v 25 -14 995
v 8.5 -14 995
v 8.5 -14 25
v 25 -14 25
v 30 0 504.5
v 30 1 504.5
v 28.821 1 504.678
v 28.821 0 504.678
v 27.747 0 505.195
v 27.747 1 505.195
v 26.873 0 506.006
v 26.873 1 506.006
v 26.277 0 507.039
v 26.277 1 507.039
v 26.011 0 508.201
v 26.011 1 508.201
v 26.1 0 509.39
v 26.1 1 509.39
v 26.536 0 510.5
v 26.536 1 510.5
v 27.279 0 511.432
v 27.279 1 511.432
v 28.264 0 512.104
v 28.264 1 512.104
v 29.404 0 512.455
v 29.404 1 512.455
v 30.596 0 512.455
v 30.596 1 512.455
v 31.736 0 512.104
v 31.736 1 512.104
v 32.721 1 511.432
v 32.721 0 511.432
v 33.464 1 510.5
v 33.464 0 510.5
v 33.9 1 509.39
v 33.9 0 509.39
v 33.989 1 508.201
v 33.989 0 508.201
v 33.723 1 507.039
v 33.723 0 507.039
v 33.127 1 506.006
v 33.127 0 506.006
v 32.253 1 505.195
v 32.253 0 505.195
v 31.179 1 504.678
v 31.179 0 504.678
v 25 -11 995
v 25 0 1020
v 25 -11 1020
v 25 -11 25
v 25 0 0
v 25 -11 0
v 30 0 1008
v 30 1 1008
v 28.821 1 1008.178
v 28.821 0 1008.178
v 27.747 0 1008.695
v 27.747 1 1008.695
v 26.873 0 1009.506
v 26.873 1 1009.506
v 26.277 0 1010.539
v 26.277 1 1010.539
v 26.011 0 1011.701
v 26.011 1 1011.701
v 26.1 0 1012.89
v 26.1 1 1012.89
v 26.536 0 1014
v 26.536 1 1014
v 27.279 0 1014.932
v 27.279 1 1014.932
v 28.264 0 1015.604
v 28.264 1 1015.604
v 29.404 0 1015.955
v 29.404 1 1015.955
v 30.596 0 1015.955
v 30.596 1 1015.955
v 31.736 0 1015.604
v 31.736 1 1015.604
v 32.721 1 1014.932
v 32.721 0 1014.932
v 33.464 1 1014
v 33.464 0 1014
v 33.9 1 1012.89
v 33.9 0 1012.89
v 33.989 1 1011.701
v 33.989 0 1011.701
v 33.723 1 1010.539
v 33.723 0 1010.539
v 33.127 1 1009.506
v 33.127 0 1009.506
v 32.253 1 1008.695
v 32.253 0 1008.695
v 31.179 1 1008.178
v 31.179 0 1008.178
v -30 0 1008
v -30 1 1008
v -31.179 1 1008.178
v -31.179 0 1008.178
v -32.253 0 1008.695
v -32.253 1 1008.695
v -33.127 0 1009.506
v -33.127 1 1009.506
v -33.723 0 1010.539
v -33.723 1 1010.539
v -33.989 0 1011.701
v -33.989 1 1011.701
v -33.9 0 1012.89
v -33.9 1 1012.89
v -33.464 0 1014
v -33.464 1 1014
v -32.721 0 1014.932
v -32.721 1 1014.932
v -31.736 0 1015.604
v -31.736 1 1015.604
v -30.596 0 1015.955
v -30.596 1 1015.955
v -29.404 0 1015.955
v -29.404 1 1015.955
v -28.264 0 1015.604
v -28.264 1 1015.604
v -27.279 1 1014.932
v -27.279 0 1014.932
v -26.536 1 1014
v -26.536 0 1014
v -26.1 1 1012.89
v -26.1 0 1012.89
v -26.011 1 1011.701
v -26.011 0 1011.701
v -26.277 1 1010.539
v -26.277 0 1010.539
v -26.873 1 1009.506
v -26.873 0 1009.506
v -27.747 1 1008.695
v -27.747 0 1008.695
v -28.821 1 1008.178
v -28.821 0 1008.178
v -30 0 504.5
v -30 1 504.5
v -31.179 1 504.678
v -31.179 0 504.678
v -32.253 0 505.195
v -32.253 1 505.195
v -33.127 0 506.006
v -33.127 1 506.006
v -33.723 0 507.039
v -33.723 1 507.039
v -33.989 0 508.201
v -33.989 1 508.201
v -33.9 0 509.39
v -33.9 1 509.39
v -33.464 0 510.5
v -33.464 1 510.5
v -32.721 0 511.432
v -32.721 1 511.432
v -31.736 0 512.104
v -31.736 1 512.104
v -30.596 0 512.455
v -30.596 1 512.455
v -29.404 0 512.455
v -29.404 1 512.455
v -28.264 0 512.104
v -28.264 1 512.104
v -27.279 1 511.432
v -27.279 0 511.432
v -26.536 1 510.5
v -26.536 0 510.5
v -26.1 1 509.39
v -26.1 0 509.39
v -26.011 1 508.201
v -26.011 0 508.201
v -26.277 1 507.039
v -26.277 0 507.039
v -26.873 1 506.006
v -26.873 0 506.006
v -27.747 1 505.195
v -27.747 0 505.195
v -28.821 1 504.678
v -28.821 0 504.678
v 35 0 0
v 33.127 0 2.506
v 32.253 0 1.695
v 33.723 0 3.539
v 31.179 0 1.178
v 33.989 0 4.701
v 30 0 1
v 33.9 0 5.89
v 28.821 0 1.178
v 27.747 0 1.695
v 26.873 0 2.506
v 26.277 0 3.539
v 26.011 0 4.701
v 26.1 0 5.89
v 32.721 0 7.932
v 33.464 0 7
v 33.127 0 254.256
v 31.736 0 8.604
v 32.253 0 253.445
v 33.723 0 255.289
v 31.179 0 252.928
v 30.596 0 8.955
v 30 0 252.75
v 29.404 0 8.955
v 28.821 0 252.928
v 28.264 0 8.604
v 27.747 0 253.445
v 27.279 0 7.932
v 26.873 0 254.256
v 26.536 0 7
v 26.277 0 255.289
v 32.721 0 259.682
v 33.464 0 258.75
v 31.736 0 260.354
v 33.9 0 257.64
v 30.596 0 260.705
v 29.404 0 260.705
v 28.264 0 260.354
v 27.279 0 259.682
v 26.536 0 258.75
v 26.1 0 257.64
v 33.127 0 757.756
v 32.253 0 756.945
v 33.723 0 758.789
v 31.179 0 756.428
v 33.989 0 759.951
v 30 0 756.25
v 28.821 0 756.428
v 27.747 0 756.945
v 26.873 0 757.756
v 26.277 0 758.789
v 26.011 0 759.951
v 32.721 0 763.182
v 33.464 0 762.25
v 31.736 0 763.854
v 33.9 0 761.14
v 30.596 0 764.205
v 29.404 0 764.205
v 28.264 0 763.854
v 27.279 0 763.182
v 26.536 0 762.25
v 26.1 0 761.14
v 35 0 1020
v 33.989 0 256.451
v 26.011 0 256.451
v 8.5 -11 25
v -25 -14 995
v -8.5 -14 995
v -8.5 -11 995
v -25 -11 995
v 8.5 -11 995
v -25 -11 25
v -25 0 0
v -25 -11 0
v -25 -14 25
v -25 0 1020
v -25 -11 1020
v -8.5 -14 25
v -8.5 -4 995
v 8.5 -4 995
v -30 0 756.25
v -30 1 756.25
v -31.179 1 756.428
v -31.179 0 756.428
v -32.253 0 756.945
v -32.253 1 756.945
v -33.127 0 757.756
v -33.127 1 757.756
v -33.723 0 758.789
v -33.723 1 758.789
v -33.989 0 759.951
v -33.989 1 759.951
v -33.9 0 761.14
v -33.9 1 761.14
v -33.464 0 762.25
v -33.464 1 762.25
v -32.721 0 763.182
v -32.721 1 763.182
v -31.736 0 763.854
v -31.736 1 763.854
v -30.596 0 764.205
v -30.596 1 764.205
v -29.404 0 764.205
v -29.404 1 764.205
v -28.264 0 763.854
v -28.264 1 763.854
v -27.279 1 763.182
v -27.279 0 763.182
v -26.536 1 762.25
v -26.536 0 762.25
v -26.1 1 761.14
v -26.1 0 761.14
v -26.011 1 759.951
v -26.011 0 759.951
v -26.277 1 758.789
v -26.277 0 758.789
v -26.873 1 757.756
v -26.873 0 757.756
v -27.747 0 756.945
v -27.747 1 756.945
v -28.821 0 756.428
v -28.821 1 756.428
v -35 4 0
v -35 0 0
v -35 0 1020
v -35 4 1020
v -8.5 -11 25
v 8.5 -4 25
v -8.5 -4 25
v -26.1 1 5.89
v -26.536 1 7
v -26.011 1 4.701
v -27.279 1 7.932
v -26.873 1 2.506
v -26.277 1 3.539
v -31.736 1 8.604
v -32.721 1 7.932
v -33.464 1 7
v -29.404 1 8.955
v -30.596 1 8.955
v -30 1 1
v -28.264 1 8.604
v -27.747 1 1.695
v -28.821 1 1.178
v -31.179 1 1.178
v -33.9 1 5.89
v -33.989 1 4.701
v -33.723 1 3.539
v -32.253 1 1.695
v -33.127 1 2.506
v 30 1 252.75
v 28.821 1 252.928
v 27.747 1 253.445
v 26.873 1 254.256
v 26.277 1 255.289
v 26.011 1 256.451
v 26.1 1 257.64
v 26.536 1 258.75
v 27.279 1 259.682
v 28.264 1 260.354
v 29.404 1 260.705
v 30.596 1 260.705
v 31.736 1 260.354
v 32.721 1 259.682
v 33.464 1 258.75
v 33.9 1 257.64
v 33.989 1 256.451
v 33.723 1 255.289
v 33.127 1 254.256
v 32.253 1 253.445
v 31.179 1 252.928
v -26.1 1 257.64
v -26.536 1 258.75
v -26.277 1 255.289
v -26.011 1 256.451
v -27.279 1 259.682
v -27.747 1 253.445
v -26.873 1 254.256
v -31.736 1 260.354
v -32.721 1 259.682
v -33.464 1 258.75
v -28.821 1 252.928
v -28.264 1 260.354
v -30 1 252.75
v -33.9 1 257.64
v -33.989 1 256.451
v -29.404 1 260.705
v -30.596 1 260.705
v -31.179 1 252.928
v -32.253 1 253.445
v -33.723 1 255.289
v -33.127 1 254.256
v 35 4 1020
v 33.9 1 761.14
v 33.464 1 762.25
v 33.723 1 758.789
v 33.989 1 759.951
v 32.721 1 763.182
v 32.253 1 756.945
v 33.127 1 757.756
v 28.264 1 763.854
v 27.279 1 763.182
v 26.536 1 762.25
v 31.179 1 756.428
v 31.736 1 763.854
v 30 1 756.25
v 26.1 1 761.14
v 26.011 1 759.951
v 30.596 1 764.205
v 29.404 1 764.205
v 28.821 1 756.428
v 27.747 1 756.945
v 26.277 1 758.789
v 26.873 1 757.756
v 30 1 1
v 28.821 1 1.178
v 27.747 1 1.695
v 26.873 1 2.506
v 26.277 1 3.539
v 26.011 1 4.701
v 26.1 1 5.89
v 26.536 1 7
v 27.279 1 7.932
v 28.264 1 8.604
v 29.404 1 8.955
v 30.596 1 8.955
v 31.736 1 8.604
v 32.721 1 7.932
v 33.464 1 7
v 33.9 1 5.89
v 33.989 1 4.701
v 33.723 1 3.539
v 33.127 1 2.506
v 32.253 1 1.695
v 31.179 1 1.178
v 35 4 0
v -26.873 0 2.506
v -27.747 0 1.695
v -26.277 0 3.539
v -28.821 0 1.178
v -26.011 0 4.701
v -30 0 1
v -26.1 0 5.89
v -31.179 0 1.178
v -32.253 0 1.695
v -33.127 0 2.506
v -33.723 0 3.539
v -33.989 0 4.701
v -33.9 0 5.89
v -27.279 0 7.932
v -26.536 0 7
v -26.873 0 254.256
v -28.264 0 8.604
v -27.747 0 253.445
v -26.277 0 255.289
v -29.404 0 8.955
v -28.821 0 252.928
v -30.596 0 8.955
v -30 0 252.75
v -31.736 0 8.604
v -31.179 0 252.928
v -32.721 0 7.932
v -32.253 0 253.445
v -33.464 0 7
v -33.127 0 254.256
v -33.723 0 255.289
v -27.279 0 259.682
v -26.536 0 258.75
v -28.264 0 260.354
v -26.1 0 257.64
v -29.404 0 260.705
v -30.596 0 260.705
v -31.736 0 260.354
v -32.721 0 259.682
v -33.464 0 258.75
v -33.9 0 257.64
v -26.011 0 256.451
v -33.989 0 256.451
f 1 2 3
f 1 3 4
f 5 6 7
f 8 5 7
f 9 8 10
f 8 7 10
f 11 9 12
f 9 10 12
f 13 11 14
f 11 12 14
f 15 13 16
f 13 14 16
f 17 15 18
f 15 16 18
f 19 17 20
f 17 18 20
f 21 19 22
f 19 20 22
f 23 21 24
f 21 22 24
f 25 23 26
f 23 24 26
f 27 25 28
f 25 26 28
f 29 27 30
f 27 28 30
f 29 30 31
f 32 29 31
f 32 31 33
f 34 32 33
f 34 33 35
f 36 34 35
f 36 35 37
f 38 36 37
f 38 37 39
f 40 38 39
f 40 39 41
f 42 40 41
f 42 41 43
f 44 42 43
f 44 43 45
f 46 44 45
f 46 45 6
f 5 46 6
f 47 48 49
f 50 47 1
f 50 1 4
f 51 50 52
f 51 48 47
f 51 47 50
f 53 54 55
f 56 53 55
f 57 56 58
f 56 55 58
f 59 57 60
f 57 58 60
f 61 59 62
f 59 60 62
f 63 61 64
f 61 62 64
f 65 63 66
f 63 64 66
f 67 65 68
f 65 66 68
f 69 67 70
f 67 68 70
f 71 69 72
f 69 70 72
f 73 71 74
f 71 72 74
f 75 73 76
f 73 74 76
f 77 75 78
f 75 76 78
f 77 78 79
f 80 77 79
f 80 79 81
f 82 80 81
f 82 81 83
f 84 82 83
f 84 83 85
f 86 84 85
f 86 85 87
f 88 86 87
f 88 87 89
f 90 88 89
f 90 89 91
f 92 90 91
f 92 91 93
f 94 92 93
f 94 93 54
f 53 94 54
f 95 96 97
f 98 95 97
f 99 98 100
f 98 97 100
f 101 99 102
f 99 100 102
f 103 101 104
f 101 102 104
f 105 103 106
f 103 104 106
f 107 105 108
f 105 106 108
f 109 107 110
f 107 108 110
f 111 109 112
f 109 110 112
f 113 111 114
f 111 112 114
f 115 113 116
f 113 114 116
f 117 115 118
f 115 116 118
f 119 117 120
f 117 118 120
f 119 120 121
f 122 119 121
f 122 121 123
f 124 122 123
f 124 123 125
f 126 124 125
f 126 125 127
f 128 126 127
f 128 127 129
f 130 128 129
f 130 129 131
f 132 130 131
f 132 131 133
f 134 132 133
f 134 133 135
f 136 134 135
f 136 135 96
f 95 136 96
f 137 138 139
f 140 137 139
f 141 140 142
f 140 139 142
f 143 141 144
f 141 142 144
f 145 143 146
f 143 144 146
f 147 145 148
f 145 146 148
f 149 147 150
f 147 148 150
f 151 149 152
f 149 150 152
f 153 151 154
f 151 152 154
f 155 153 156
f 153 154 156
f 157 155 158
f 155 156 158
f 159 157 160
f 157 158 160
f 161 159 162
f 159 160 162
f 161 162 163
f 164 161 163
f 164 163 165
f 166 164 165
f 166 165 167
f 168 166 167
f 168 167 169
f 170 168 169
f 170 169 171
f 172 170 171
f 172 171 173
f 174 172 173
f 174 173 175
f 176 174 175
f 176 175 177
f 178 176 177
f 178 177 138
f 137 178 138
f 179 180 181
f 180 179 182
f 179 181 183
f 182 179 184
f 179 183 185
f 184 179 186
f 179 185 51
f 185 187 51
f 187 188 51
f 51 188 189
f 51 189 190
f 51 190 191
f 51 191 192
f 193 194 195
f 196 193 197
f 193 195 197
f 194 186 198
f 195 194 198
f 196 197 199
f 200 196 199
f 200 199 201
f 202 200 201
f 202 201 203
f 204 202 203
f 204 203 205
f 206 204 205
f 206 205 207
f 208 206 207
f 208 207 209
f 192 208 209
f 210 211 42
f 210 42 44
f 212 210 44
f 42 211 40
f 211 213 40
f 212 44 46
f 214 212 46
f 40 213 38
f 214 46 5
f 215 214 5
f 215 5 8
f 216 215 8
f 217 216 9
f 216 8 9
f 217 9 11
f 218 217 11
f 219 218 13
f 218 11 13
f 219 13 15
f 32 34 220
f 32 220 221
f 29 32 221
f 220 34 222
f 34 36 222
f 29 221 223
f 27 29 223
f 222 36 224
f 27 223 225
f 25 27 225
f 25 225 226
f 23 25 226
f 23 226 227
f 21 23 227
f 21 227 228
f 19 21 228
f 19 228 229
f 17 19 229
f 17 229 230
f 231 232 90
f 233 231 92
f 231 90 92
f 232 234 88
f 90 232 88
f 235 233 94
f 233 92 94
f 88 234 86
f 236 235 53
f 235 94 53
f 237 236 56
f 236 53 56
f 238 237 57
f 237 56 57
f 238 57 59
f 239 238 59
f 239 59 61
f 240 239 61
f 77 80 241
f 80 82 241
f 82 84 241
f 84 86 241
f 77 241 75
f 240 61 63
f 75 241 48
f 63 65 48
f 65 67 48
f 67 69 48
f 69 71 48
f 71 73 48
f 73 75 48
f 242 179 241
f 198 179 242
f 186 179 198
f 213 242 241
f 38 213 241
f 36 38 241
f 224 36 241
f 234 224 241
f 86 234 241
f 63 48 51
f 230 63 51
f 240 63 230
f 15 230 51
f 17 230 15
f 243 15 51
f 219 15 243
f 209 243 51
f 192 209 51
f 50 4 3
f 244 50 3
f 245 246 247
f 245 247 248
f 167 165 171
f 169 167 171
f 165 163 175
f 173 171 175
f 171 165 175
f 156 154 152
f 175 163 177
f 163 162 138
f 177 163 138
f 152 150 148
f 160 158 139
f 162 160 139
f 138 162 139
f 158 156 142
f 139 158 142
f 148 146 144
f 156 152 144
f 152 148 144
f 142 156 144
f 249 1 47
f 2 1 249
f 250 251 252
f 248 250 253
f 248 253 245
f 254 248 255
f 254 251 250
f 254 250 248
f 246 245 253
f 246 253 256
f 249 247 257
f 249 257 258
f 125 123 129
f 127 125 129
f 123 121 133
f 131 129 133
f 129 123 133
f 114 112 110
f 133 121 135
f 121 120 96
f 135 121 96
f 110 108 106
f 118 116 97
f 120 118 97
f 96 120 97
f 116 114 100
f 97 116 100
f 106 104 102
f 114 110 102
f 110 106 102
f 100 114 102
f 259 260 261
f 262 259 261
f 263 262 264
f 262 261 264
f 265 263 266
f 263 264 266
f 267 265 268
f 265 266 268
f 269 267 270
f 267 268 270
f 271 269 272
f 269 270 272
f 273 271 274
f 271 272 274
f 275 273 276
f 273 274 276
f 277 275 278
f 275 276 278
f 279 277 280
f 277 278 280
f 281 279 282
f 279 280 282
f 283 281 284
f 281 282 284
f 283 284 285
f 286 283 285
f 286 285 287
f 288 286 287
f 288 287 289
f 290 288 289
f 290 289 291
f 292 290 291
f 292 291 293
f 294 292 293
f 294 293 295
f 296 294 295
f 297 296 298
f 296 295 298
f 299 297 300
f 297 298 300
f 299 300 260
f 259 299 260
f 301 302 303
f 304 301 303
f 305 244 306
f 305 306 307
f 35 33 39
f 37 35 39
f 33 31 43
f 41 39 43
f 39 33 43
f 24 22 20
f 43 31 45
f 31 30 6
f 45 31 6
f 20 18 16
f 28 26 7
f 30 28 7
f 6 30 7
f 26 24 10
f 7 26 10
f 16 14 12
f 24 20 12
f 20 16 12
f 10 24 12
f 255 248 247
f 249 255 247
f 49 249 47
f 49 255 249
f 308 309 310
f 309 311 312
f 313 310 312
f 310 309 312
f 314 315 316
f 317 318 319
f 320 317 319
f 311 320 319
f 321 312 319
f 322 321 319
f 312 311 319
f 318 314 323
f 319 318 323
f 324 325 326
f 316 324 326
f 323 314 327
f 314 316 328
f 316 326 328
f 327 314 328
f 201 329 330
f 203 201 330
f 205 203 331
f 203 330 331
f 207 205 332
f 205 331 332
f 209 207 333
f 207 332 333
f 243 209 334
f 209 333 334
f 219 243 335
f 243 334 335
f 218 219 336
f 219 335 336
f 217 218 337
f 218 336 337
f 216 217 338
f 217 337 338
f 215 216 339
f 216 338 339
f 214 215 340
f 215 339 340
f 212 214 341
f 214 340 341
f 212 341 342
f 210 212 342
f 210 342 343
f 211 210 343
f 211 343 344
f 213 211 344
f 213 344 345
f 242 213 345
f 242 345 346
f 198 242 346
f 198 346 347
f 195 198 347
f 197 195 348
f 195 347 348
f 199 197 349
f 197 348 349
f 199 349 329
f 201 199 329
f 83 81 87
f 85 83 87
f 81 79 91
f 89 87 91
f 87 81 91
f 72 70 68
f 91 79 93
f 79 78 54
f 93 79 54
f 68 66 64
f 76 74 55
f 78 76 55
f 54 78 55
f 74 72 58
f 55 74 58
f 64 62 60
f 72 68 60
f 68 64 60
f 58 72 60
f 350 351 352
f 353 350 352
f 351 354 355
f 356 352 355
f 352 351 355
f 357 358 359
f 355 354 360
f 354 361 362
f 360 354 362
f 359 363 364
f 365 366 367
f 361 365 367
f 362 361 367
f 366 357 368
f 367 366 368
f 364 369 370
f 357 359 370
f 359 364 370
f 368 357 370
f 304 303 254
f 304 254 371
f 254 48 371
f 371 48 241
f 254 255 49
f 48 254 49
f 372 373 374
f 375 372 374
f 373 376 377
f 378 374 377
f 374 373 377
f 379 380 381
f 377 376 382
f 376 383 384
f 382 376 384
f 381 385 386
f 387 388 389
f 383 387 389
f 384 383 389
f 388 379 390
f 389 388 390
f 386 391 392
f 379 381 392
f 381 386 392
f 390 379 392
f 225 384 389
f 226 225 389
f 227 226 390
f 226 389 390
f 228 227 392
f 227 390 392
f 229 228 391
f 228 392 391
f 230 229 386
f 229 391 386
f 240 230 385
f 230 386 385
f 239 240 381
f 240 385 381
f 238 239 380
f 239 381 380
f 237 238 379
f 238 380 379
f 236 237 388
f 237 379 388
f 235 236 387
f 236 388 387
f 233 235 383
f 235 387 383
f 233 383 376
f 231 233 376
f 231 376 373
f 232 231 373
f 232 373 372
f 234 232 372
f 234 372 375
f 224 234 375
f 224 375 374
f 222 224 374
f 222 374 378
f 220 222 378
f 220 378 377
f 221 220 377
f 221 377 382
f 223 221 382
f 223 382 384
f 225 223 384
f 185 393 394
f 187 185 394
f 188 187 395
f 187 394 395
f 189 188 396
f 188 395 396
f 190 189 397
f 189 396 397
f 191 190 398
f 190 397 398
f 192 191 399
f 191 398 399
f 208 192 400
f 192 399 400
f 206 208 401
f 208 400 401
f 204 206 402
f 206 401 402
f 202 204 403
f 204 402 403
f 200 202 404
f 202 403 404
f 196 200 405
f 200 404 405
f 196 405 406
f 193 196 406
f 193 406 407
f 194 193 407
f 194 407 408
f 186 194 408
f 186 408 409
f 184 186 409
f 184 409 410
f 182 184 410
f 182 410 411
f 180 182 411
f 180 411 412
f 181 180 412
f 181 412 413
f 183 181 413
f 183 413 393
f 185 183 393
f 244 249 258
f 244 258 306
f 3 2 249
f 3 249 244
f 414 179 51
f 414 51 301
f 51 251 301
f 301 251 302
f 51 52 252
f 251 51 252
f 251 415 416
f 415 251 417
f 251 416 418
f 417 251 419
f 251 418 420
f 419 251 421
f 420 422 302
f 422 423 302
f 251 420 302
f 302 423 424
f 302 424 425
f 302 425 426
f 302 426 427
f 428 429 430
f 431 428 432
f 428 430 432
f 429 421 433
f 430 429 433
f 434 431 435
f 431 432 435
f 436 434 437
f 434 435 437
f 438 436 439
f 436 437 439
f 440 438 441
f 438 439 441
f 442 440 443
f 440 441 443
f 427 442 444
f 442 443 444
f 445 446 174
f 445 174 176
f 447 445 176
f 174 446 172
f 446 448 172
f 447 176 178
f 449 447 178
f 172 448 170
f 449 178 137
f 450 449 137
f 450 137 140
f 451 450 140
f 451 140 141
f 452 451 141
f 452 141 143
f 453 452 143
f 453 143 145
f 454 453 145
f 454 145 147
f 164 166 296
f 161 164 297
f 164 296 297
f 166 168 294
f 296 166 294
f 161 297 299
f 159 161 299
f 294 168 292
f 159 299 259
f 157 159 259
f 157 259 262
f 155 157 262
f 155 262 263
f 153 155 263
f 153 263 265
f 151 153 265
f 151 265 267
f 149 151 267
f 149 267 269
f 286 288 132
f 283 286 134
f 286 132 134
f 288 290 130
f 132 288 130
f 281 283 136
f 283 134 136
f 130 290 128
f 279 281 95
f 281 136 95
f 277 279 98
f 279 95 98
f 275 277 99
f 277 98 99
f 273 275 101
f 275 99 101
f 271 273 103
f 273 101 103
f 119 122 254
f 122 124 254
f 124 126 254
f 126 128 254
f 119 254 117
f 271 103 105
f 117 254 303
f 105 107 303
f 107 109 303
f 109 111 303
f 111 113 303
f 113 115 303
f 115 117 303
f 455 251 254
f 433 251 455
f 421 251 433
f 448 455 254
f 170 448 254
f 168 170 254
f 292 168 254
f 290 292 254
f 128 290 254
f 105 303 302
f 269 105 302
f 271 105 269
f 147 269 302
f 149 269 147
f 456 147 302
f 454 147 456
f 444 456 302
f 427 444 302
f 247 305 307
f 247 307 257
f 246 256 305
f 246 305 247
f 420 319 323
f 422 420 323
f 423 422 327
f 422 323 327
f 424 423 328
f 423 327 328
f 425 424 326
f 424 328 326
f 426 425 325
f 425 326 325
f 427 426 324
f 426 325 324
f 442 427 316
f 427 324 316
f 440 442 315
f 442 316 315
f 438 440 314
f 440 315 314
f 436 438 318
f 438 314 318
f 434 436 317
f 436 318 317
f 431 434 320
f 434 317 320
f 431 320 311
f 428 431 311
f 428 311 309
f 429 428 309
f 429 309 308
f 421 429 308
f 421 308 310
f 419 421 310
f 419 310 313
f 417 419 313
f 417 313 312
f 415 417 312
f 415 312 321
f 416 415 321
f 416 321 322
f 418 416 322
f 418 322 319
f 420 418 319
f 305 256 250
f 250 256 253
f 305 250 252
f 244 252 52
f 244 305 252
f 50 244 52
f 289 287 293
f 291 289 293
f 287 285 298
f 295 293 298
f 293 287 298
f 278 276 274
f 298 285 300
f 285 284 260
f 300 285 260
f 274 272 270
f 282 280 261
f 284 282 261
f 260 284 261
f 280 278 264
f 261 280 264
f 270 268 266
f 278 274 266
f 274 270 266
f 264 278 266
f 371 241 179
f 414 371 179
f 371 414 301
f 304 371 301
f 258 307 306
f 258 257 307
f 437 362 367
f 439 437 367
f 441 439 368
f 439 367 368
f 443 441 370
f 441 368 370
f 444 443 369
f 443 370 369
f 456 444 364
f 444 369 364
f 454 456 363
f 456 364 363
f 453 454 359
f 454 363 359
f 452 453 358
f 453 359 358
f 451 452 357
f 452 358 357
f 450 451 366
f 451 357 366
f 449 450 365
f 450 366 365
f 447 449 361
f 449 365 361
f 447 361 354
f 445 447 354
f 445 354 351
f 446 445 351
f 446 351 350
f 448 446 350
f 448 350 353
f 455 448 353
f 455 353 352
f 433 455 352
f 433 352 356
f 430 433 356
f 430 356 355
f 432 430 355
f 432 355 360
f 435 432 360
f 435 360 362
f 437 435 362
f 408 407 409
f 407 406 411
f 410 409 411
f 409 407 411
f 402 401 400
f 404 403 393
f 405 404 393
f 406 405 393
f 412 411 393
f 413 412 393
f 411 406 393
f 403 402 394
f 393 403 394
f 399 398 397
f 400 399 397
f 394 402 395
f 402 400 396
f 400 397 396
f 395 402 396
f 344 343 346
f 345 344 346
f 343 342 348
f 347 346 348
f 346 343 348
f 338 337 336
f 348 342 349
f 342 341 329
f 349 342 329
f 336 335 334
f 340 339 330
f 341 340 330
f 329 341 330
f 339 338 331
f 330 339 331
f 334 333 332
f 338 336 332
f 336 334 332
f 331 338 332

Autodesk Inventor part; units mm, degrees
ref_plane "YZ Plane" through (0, 0, 0) normal (1, 0, 0) x (0, 1, 0)
ref_plane "XZ Plane" through (0, 0, 0) normal (0, 1, 0) x (-1, 0, 0)
ref_plane "XY Plane" through (0, 0, 0) normal (0, 0, 1) x (1, 0, 0)
sketch "Skizze2" plane through (0, 0, 0) normal (0, 1, 0) x (-1, 0, 0)
  line L0 (0, 514) -> (0, -212) construction
  line L1 (-35, 0) -> (35, 0)
  line L2 (35, 0) -> (35, 1020)
  line L3 (35, 1020) -> (-35, 1020)
  line L4 (-35, 1020) -> (-35, 0)
  point P0 (0, 0)
  dimension "breite" = 70
  dimension "laenge" = 1020
extrude "Extrusion1" add sketch "Skizze2" along normal blind 4
sketch "Skizze3" plane through (0, 0, 0) normal (0, -1, 0) x (1, 0, 0)
  line L0 (35, 0) -> (-35, 0) projected
  line L1 (35, 1020) -> (35, 0) projected
  line L2 (-35, 1020) -> (35, 1020) projected
  line L3 (-35, 0) -> (-35, 1020) projected
  line L4 (-35, 1020) -> (35, 1020) projected
  line L5 (35, 0) -> (-35, 0) projected
  line L6 (-25, 1020) -> (25, 1020)
  line L7 (25, 1020) -> (25, 0)
  line L8 (25, 0) -> (-25, 0)
  line L9 (-25, 0) -> (-25, 1020)
  line L10 (0, 1159.0325) -> (0, -216) construction
  point P0 (0, 0)
  dimension "d4" = 50
extrude "Extrusion2" add sketch "Skizze3" along normal blind 14 contours L0 L9 L2 L7
sketch "Skizze4" plane through (0, -14, 0) normal (0, -1, 0) x (1, 0, 0)
  line L0 (-25, 1020) -> (-25, 0) projected
  line L1 (-25, 0) -> (25, 0) projected
  line L2 (25, 0) -> (25, 1020) projected
  line L3 (25, 1020) -> (-25, 1020) projected
  line L4 (-8.5, 995) -> (8.5, 995)
  line L5 (8.5, 995) -> (8.5, 25)
  line L6 (8.5, 25) -> (-8.5, 25)
  line L7 (-8.5, 25) -> (-8.5, 995)
  line L8 (0, -47) -> (0, 1281) construction
  line L9 (-397, 510) -> (541, 510) construction
  line L10 (35, 1020) -> (35, 0) projected
  line L11 (-25, 0) -> (25, 0)
  line L12 (25, 0) -> (25, 25)
  line L13 (25, 25) -> (-25, 25)
  line L14 (-25, 25) -> (-25, 0)
  line L15 (-25, 1020) -> (25, 1020)
  line L16 (25, 1020) -> (25, 995)
  line L17 (25, 995) -> (-25, 995)
  line L18 (-25, 995) -> (-25, 1020)
  line L19 (-24, 1) -> (26, 1)
  line L20 (26, 1021) -> (-24, 1021)
  line L21 (-7.5, 996) -> (9.5, 996)
  line L22 (9.5, 26) -> (-7.5, 26)
  line L23 (-24, 1) -> (26, 1)
  line L24 (26, 1) -> (26, 26)
  line L25 (26, 26) -> (-24, 26)
  line L26 (-24, 26) -> (-24, 1)
  line L27 (-24, 1021) -> (26, 1021)
  line L28 (26, 1021) -> (26, 996)
  line L29 (26, 996) -> (-24, 996)
  line L30 (-24, 996) -> (-24, 1021)
  point P0 (0, 0)
  point P1 (1, 1)
  point P2 (36, 1021)
  point P3 (36, 1)
  dimension "d8" = 25
  dimension "d9" = 510
  dimension "d10" = 35
  dimension "d11" = 17
  dimension "d14" = 25
  dimension "d15" = 17
extrude "Extrusion3" cut sketch "Skizze4" against normal blind 10 contours L4 L5 L22 L25 L7 | L25 L22 L5 L6 L7
sketch "Skizze6" plane through (0, -14, 0) normal (0, -1, 0) x (1, 0, 0)
  line L0 (-25, 0) -> (25, 0)
  line L1 (25, 1020) -> (-25, 1020)
  line L2 (-8.5, 995) -> (8.5, 995)
  line L3 (8.5, 25) -> (-8.5, 25)
  line L4 (-25, 0) -> (25, 0)
  line L5 (25, 0) -> (25, 25)
  line L6 (25, 25) -> (-25, 25)
  line L7 (-25, 25) -> (-25, 0)
  line L8 (-25, 1020) -> (25, 1020)
  line L9 (25, 1020) -> (25, 995)
  line L10 (25, 995) -> (-25, 995)
  line L11 (-25, 995) -> (-25, 1020)
  point P0 (0, 0)
  point P1 (0, 0)
  point P2 (35, 1020)
  point P3 (35, 0)
  dimension "d16" = 25
  dimension "d17" = 17
extrude "Extrusion4" cut sketch "Skizze6" against normal blind 3
sketch "Skizze7" plane through (0, 0, 0) normal (0, -1, 0) x (1, 0, 0)
  line L0 (-25, 0) -> (-25, 1020) projected
  line L1 (-35, 1020) -> (-25, 1020) projected
  line L2 (-35, 0) -> (-35, 1020) projected
  line L3 (-25, 0) -> (-35, 0) projected
  line L4 (25, 1020) -> (25, 0) projected
  line L5 (35, 0) -> (25, 0) projected
  line L6 (35, 1020) -> (35, 0) projected
  line L7 (25, 1020) -> (35, 1020) projected
  line L8 (0, 1058) -> (0, -187) construction
  line L9 (-30, 1012) -> (-30, 5) construction
  point P0 (0, 0)
  point P1 (-30, 760.25)
  point P2 (-30, 508.5)
  point P3 (-30, 256.75)
  point P4 (30, 1012)
  point P5 (30, 5)
  point P6 (30, 760.25)
  point P7 (30, 508.5)
  point P8 (30, 256.75)
  dimension "d20" = 5
  dimension "d21" = 8
  dimension "d22" = 5
  dimension "d23" = 5
  dimension "d26" = 251.75
  dimension "d27" = 503.5
  dimension "d28" = 755.25
hole "Bohrung1" at (-30, 0, 1012) at (-30, 0, 5) at (-30, 0, 760.25) at (-30, 0, 508.5) at (-30, 0, 256.75) at (30, 0, 1012) at (30, 0, 760.25) at (30, 0, 508.5) at (30, 0, 256.75) at (30, 0, 5) direction (0, 1, 0) diameter 8 depth 1
equation "\"d9\" = 0.5 * laenge"
equation "\"d10\" = 0.5 * breite"
properties part number "Wiper-Woodconstruction" material "Holz (Birke)"
